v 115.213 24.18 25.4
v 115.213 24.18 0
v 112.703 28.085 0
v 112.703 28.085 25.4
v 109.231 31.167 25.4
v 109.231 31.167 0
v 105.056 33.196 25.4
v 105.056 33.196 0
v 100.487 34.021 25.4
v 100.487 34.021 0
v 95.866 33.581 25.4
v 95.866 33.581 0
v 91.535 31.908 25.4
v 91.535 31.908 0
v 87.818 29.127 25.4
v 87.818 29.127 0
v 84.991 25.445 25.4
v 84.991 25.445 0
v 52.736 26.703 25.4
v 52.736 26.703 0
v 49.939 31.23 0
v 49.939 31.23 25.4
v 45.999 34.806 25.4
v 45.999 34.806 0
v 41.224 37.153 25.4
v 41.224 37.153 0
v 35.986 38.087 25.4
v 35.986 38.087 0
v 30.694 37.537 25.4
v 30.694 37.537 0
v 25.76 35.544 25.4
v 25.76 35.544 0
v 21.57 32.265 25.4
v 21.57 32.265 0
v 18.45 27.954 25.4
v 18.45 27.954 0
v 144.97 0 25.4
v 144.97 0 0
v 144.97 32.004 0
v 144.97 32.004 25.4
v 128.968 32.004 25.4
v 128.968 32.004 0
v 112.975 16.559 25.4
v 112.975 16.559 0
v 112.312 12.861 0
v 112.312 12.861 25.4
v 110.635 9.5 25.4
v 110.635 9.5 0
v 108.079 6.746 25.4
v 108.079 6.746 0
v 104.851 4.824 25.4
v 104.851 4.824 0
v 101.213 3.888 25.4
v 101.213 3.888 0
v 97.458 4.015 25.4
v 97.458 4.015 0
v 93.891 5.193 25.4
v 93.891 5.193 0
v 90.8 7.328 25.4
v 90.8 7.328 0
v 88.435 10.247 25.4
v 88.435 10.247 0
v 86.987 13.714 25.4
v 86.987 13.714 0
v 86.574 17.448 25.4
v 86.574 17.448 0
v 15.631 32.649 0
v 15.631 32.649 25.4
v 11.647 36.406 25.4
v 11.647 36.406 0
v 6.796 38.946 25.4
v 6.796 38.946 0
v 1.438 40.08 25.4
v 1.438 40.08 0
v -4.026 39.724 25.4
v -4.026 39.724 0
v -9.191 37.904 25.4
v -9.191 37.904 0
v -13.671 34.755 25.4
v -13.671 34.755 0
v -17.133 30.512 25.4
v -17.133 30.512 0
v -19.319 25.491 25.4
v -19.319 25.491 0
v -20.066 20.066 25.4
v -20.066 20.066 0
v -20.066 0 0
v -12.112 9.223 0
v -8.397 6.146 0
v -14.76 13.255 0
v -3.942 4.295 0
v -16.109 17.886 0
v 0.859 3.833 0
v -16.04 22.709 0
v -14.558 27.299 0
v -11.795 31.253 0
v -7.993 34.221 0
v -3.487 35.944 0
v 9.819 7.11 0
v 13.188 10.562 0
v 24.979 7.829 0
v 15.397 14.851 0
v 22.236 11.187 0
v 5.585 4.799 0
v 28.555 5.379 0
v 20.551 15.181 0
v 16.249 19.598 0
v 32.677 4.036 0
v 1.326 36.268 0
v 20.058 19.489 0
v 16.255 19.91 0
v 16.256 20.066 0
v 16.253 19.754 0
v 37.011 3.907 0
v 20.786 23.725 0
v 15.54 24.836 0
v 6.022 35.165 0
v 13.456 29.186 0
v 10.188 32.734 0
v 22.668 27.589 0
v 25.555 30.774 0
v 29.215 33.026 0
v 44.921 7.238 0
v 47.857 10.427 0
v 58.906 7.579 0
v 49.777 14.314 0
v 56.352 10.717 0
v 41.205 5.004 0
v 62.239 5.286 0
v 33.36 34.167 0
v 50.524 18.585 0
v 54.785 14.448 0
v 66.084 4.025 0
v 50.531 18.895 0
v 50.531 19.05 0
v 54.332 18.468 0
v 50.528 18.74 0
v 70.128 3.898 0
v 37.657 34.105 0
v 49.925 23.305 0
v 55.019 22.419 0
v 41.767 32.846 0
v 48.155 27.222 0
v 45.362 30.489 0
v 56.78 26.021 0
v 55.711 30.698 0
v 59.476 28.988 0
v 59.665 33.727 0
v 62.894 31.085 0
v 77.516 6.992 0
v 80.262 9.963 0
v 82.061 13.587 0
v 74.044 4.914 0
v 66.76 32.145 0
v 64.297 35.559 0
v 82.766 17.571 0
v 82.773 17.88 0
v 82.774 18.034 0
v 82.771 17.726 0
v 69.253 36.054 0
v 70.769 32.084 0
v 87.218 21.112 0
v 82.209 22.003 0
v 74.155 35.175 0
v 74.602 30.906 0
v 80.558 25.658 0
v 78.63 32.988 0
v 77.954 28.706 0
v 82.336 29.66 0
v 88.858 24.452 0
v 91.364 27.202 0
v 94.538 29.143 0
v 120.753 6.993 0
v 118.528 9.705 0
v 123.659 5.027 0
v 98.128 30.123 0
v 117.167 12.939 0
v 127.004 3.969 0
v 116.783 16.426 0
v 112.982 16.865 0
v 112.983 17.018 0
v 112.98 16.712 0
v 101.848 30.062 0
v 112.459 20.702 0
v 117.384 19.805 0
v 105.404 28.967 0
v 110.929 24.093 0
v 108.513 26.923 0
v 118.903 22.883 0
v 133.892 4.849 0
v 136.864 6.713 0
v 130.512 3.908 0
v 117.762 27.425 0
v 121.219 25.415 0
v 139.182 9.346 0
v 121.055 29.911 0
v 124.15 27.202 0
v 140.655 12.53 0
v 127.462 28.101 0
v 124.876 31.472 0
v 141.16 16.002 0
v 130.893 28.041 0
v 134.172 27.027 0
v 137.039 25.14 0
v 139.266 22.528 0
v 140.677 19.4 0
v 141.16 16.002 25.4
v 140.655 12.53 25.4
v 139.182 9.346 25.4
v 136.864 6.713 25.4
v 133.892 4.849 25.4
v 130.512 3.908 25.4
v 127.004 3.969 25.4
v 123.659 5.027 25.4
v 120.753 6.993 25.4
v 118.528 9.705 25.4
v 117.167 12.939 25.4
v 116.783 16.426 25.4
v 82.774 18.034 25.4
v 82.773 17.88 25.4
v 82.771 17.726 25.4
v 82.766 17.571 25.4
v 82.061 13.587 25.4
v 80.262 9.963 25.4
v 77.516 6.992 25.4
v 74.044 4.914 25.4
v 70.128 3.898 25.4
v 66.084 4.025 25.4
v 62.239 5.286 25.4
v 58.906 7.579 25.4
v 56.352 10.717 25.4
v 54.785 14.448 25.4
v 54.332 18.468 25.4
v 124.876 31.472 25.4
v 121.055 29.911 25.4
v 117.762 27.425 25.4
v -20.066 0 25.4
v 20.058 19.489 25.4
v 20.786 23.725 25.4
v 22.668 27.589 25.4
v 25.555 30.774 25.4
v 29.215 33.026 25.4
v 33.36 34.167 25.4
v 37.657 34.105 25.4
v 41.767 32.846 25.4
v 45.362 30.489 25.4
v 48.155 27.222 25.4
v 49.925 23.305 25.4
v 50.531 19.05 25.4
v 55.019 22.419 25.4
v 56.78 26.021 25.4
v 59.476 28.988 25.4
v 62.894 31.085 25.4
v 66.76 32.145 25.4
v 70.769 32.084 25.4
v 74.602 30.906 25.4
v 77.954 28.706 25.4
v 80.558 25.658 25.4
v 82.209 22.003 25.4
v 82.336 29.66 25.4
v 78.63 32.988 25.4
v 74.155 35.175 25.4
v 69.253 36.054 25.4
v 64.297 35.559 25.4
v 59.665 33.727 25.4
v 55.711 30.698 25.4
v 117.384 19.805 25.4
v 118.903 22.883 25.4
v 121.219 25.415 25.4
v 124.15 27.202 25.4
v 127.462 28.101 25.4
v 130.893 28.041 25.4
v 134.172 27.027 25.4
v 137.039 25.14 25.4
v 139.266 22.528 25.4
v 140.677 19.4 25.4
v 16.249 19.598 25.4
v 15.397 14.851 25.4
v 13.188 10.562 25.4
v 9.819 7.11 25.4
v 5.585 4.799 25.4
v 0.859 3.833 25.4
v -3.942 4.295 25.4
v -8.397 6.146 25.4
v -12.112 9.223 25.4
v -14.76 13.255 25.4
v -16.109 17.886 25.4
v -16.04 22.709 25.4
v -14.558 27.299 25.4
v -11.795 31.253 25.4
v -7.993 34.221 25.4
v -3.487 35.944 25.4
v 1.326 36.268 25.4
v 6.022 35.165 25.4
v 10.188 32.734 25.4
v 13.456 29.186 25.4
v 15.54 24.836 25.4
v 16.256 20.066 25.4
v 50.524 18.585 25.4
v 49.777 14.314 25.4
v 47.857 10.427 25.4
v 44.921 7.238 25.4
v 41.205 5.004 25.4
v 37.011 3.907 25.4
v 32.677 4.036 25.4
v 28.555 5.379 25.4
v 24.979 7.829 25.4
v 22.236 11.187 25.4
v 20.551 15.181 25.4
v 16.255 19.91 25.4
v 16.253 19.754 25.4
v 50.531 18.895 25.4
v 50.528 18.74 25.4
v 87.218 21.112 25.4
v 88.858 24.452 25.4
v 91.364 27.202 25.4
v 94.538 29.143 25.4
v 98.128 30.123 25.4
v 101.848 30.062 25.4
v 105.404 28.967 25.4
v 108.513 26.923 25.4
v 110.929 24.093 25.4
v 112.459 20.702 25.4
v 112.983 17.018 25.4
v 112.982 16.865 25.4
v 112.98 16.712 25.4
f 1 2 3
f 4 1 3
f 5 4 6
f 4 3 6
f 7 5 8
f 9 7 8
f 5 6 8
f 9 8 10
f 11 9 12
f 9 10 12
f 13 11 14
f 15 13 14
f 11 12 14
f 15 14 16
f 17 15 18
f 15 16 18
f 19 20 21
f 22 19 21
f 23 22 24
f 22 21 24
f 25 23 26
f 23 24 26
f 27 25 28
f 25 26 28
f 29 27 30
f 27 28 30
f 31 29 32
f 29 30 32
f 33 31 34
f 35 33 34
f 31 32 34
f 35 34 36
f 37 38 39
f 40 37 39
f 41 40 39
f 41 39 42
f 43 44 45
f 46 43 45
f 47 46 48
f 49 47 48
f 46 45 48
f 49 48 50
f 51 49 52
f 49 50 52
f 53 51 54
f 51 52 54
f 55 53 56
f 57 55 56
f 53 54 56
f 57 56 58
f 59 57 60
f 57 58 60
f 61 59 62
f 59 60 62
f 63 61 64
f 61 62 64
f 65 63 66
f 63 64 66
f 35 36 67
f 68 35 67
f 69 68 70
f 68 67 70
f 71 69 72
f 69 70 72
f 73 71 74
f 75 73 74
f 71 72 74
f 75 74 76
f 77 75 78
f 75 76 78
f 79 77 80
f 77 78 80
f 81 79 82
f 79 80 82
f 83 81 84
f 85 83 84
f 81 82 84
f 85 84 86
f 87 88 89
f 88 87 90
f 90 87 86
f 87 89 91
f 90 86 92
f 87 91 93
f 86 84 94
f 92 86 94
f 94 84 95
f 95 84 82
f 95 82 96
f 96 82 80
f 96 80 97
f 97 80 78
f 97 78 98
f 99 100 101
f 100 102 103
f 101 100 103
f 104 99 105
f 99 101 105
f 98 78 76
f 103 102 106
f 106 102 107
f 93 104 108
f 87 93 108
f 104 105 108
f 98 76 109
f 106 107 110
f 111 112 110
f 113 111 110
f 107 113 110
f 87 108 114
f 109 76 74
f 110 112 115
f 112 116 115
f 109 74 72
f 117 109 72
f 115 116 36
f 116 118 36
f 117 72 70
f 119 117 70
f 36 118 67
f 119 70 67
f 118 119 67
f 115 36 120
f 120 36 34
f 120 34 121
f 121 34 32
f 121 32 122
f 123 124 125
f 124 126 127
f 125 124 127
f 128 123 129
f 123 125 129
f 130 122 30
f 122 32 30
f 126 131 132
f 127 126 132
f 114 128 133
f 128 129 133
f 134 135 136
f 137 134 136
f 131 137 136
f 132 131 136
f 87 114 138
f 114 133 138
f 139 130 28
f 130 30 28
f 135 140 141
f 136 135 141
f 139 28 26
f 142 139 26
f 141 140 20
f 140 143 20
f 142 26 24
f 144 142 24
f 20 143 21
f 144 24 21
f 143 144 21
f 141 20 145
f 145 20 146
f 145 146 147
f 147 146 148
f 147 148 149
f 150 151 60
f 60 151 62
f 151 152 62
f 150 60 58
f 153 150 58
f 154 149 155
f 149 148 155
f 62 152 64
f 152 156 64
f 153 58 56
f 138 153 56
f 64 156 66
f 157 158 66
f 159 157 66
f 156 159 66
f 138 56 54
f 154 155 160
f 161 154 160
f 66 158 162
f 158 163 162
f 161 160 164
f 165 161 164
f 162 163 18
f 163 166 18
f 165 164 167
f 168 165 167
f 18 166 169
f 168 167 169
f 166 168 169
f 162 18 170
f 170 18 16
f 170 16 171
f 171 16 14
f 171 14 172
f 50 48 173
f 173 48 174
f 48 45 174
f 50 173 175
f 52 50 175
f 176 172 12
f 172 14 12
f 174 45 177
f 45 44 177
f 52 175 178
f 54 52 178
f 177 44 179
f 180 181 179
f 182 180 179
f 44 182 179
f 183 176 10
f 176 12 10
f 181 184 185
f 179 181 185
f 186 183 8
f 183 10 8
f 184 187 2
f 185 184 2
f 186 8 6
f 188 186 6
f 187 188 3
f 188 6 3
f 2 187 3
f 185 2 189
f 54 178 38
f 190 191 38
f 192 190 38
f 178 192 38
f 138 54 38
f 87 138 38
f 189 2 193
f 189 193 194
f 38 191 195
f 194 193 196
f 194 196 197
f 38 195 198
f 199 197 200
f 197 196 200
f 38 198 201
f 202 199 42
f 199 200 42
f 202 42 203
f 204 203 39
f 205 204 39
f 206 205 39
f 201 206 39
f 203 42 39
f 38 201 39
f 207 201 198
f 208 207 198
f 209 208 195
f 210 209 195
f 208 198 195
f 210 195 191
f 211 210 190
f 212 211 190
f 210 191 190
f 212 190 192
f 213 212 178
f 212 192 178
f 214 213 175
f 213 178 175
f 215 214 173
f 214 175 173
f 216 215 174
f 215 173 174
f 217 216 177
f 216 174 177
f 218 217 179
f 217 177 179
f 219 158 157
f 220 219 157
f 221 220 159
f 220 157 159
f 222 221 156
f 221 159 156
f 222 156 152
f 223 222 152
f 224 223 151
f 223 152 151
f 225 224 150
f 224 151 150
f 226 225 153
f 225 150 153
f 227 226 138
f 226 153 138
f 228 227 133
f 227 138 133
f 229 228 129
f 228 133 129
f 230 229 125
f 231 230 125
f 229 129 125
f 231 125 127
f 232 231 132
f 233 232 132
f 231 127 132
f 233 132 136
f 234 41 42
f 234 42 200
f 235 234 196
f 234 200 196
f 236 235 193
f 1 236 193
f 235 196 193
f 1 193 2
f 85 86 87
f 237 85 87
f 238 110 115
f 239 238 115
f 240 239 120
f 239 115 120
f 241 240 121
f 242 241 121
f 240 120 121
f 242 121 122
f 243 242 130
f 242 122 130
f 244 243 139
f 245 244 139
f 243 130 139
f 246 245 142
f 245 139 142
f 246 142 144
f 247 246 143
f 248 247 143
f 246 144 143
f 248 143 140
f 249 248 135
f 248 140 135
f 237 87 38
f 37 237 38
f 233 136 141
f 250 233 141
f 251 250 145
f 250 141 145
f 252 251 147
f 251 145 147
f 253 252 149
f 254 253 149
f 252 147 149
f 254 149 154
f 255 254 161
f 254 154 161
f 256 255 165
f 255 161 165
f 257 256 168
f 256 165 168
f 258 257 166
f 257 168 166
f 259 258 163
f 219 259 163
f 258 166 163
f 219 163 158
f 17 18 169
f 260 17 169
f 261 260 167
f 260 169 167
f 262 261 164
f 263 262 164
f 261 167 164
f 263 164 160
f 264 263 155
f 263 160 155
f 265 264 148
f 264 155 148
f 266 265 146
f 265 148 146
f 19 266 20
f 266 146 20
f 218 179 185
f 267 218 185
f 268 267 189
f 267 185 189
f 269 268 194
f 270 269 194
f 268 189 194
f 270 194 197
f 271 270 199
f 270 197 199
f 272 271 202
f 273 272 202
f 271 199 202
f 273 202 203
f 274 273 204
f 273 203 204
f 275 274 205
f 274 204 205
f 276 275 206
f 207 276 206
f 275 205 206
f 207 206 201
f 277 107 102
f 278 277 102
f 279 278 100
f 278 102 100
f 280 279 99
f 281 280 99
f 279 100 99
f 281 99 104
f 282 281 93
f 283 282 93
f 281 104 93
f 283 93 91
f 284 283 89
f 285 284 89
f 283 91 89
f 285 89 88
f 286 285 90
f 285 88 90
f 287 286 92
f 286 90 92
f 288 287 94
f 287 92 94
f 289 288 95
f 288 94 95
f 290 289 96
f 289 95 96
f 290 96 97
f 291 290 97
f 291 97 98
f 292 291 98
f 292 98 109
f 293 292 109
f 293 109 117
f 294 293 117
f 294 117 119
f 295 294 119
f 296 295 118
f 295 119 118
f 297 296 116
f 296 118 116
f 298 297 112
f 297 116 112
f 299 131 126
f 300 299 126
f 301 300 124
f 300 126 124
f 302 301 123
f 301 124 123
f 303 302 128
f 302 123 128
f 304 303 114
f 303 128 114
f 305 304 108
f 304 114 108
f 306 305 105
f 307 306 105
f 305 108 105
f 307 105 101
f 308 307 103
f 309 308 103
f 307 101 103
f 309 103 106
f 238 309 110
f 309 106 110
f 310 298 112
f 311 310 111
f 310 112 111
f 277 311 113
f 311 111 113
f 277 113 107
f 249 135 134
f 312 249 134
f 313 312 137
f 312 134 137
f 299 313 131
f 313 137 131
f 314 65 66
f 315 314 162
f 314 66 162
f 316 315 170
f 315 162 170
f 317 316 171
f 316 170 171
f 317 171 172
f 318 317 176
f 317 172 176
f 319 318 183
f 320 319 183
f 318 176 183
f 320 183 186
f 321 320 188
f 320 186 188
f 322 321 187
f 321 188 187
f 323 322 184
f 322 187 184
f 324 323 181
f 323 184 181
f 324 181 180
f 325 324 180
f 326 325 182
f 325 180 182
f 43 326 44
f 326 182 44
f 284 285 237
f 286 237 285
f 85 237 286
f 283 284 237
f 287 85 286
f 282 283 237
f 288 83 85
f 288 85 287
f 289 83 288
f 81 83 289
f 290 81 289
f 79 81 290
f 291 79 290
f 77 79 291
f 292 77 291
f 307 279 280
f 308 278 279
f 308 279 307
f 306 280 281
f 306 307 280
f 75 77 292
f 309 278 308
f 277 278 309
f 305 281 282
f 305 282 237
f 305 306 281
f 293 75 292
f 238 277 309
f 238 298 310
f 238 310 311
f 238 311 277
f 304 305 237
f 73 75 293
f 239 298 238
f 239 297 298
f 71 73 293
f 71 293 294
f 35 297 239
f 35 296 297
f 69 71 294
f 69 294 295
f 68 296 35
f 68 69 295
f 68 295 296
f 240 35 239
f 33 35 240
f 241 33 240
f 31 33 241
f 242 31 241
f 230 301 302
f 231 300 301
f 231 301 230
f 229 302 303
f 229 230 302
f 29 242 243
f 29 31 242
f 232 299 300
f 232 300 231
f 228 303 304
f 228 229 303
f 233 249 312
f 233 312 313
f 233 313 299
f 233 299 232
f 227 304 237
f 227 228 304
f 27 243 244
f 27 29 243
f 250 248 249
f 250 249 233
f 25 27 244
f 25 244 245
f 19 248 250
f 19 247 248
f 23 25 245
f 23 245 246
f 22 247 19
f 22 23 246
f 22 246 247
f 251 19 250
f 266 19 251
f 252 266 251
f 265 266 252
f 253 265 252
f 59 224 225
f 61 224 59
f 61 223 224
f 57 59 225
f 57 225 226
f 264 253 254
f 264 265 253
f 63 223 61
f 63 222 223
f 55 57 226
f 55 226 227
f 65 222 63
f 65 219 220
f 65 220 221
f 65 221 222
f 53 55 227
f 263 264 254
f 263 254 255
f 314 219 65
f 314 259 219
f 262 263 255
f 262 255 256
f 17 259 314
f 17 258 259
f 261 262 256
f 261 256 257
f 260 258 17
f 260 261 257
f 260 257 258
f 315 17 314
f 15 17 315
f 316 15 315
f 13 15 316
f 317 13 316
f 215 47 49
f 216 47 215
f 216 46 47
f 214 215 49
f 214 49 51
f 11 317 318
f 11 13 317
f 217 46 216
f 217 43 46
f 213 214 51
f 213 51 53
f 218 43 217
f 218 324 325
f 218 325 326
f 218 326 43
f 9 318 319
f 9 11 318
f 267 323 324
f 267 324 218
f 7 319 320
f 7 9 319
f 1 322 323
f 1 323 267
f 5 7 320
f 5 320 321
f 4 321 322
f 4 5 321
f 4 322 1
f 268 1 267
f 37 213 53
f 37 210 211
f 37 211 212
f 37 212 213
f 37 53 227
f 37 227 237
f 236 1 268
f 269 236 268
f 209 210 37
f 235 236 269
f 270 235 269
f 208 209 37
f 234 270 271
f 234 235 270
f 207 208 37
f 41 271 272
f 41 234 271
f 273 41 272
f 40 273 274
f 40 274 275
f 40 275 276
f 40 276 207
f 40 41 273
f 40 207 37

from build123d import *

# Parameters (mm, degrees)
F1_DEPTH = 25.4


with BuildPart() as f1:
    # F0 (on Top) → F1 (new body)
    with BuildSketch(Plane.XY):
        with BuildLine():
            ThreePointArc((0, 0), (-14.1888046713, 5.8771953287), (-20.066, 20.066))
            Line((-20.066, 20.066), (-20.066, 0))
            Line((-20.066, 0), (0, 0))
        make_face()
        with BuildLine():
            ThreePointArc((17.9660905129, 11.129336882), (16.6211524445, 15.2651396685), (16.2492676931, 19.598201499))
            ThreePointArc((16.2492676931, 19.598201499), (16.8698181027, 23.9026921501), (18.4504618661, 27.9542705917))
            ThreePointArc((18.4504618661, 27.9542705917), (-4.0260022476, 39.7239668812), (-20.066, 20.066))
            ThreePointArc((-20.066, 20.066), (-14.1888046713, 5.8771953287), (0, 0))
            ThreePointArc((0, 0), (10.5669596828, 3.0077551002), (17.9660905129, 11.129336882))
        make_face()
        with BuildLine():
            ThreePointArc((16.2492676931, 19.598201499), (-16.2543168361, 20.2999234712), (16.256, 20.066))
            ThreePointArc((16.256, 20.066), (16.2543168361, 19.8320765288), (16.2492676931, 19.598201499))
        make_face(mode=Mode.SUBTRACT)
        with BuildLine():
            ThreePointArc((18.4504618661, 27.9542705917), (16.8698181027, 23.9026921501), (16.2492676931, 19.598201499))
            ThreePointArc((16.2492676931, 19.598201499), (16.6211524445, 15.2651396685), (17.9660905129, 11.129336882))
            ThreePointArc((17.9660905129, 11.129336882), (19.4658964939, 15.1953501781), (20.0576898143, 19.4885614204))
            ThreePointArc((20.0576898143, 19.4885614204), (20.063922346, 19.7772508128), (20.066, 20.066))
            ThreePointArc((20.066, 20.066), (19.6579668812, 24.0920022476), (18.4504618661, 27.9542705917))
        make_face()
        with BuildLine():
            ThreePointArc((35.2913783636, 0), (24.9954114371, 3.0220379638), (17.9660905129, 11.129336882))
            ThreePointArc((17.9660905129, 11.129336882), (10.5669596828, 3.0077551002), (0, 0))
            Line((0, 0), (35.2913783636, 0))
        make_face()
        with BuildLine():
            ThreePointArc((52.7363723922, 26.7034096963), (35.9859218001, 38.087334616), (18.4504618661, 27.9542705917))
            ThreePointArc((18.4504618661, 27.9542705917), (19.6579668812, 24.0920022476), (20.066, 20.066))
            ThreePointArc((20.066, 20.066), (20.063922346, 19.7772508128), (20.0576898143, 19.4885614204))
            ThreePointArc((20.0576898143, 19.4885614204), (35.5106816843, 34.2884220315), (50.5313782672, 19.05))
            ThreePointArc((50.5313782672, 19.05), (50.5296016293, 18.8173011199), (50.5242721296, 18.5846564946))
            ThreePointArc((50.5242721296, 18.5846564946), (51.150167686, 22.7748598412), (52.7363723922, 26.7034096963))
        make_face()
        with BuildLine():
            ThreePointArc((20.0576898143, 19.4885614204), (19.4658964939, 15.1953501781), (17.9660905129, 11.129336882))
            ThreePointArc((17.9660905129, 11.129336882), (24.9954114371, 3.0220379638), (35.2913783636, 0))
            ThreePointArc((35.2913783636, 0), (45.2184017505, 2.7909500658), (52.2366769647, 10.3460151624))
            ThreePointArc((52.2366769647, 10.3460151624), (50.8932296176, 14.3640617786), (50.5242721296, 18.5846564946))
            ThreePointArc((50.5242721296, 18.5846564946), (34.8394256297, 3.8167029566), (20.0576898143, 19.4885614204))
        make_face()
        with BuildLine():
            ThreePointArc((54.3413782672, 19.05), (53.9358095817, 22.9599464139), (52.7363723922, 26.7034096963))
            ThreePointArc((52.7363723922, 26.7034096963), (51.150167686, 22.7748598412), (50.5242721296, 18.5846564946))
            ThreePointArc((50.5242721296, 18.5846564946), (50.8932296176, 14.3640617786), (52.2366769647, 10.3460151624))
            ThreePointArc((52.2366769647, 10.3460151624), (53.7372042015, 14.2903775777), (54.3324955841, 18.4683202558))
            ThreePointArc((54.3324955841, 18.4683202558), (54.339157467, 18.7591262186), (54.3413782672, 19.05))
        make_face()
        with BuildLine():
            ThreePointArc((52.2366769647, 10.3460151624), (45.2184017505, 2.7909500658), (35.2913783636, 0))
            Line((35.2913783636, 0), (68.5498631996, 0))
            ThreePointArc((68.5498631996, 0), (58.8911873733, 2.8045831602), (52.2366769647, 10.3460151624))
        make_face()
        with BuildLine():
            ThreePointArc((54.3324955841, 18.4683202558), (53.7372042015, 14.2903775777), (52.2366769647, 10.3460151624))
            ThreePointArc((52.2366769647, 10.3460151624), (58.8911873733, 2.8045831602), (68.5498631996, 0))
            ThreePointArc((68.5498631996, 0), (77.8389985645, 2.576408979), (84.4739682688, 9.5694838446))
            ThreePointArc((84.4739682688, 9.5694838446), (83.1320884093, 13.4663031835), (82.7663397489, 17.5714305184))
            ThreePointArc((82.7663397489, 17.5714305184), (68.1014181096, 3.8170709012), (54.3324955841, 18.4683202558))
        make_face()
        with BuildLine():
            ThreePointArc((86.5838631996, 18.034), (86.1810315428, 21.8243903304), (84.9905329505, 25.4454461574))
            ThreePointArc((84.9905329505, 25.4454461574), (83.3981736494, 21.644099363), (82.7663397489, 17.5714305184))
            ThreePointArc((82.7663397489, 17.5714305184), (83.1320884093, 13.4663031835), (84.4739682688, 9.5694838446))
            ThreePointArc((84.4739682688, 9.5694838446), (85.9751949602, 13.388252586), (86.5743245521, 17.4475283849))
            ThreePointArc((86.5743245521, 17.4475283849), (86.5814783801, 17.7407254097), (86.5838631996, 18.034))
        make_face()
        with BuildLine():
            ThreePointArc((84.9905329505, 25.4454461574), (69.2526835345, 36.0542996528), (52.7363723922, 26.7034096963))
            ThreePointArc((52.7363723922, 26.7034096963), (53.9358095817, 22.9599464139), (54.3413782672, 19.05))
            ThreePointArc((54.3413782672, 19.05), (54.339157467, 18.7591262186), (54.3324955841, 18.4683202558))
            ThreePointArc((54.3324955841, 18.4683202558), (68.7670486464, 32.2563418072), (82.7738631996, 18.034))
            ThreePointArc((82.7738631996, 18.034), (82.7719822126, 17.80268467), (82.7663397489, 17.5714305184))
            ThreePointArc((82.7663397489, 17.5714305184), (83.3981736494, 21.644099363), (84.9905329505, 25.4454461574))
        make_face()
        with BuildLine():
            ThreePointArc((84.4739682688, 9.5694838446), (77.8389985645, 2.576408979), (68.5498631996, 0))
            Line((68.5498631996, 0), (99.7753385043, 0))
            ThreePointArc((99.7753385043, 0), (90.751661979, 2.5893622969), (84.4739682688, 9.5694838446))
        make_face()
        with BuildLine():
            ThreePointArc((86.5743245521, 17.4475283849), (85.9751949602, 13.388252586), (84.4739682688, 9.5694838446))
            ThreePointArc((84.4739682688, 9.5694838446), (90.751661979, 2.5893622969), (99.7753385043, 0))
            ThreePointArc((99.7753385043, 0), (108.4287993719, 2.3643335983), (114.6777863565, 8.8003743081))
            ThreePointArc((114.6777863565, 8.8003743081), (113.3375545812, 12.572175467), (112.9753463662, 16.5585912009))
            ThreePointArc((112.9753463662, 16.5585912009), (99.3308696276, 3.8174806383), (86.5743245521, 17.4475283849))
        make_face()
        with BuildLine():
            ThreePointArc((115.2130425103, 24.1796771097), (100.4874564143, 34.0210941914), (84.9905329505, 25.4454461574))
            ThreePointArc((84.9905329505, 25.4454461574), (86.1810315428, 21.8243903304), (86.5838631996, 18.034))
            ThreePointArc((86.5838631996, 18.034), (86.5814783801, 17.7407254097), (86.5743245521, 17.4475283849))
            ThreePointArc((86.5743245521, 17.4475283849), (99.9901311009, 30.2242533726), (112.9833385043, 17.018))
            ThreePointArc((112.9833385043, 17.018), (112.9813403186, 16.7882608441), (112.9753463662, 16.5585912009))
            ThreePointArc((112.9753463662, 16.5585912009), (113.6138262125, 20.5101794262), (115.2130425103, 24.1796771097))
        make_face()
        with BuildLine():
            ThreePointArc((116.7933385043, 17.018), (116.3935690174, 20.6849794945), (115.2130425103, 24.1796771097))
            ThreePointArc((115.2130425103, 24.1796771097), (113.6138262125, 20.5101794262), (112.9753463662, 16.5585912009))
            ThreePointArc((112.9753463662, 16.5585912009), (113.3375545812, 12.572175467), (114.6777863565, 8.8003743081))
            ThreePointArc((114.6777863565, 8.8003743081), (116.1796742164, 12.4891928897), (116.7830409477, 16.4260696034))
            ThreePointArc((116.7830409477, 16.4260696034), (116.7907639204, 16.7219900196), (116.7933385043, 17.018))
        make_face()
        with BuildLine():
            ThreePointArc((128.9676635915, 32.004), (121.0554952765, 29.9110472914), (115.2130425103, 24.1796771097))
            ThreePointArc((115.2130425103, 24.1796771097), (116.3935690174, 20.6849794945), (116.7933385043, 17.018))
            ThreePointArc((116.7933385043, 17.018), (116.7907639204, 16.7219900196), (116.7830409477, 16.4260696034))
            ThreePointArc((116.7830409477, 16.4260696034), (116.1796742164, 12.4891928897), (114.6777863565, 8.8003743081))
            ThreePointArc((114.6777863565, 8.8003743081), (120.5764899645, 2.3765748998), (128.9676635915, 0))
            ThreePointArc((128.9676635915, 0), (140.2827863041, 4.6868772875), (144.9696635915, 16.002))
            ThreePointArc((144.9696635915, 16.002), (140.2827863041, 27.3171227125), (128.9676635915, 32.004))
        make_face()
        with BuildLine():
            ThreePointArc((141.1596635915, 16.002), (128.7555967071, 3.8118444786), (116.7830409477, 16.4260696034))
            ThreePointArc((116.7830409477, 16.4260696034), (129.179730476, 28.1921555214), (141.1596635915, 16.002))
        make_face(mode=Mode.SUBTRACT)
        with BuildLine():
            ThreePointArc((114.6777863565, 8.8003743081), (108.4287993719, 2.3643335983), (99.7753385043, 0))
            Line((99.7753385043, 0), (128.9676635915, 0))
            ThreePointArc((128.9676635915, 0), (120.5764899645, 2.3765748998), (114.6777863565, 8.8003743081))
        make_face()
        with BuildLine():
            ThreePointArc((144.9696635915, 16.002), (140.2827863041, 4.6868772875), (128.9676635915, 0))
            Line((128.9676635915, 0), (144.9696635915, 0))
            Line((144.9696635915, 0), (144.9696635915, 16.002))
        make_face()
        with BuildLine():
            Line((144.9696635915, 32.004), (128.9676635915, 32.004))
            ThreePointArc((128.9676635915, 32.004), (140.2827863041, 27.3171227125), (144.9696635915, 16.002))
            Line((144.9696635915, 16.002), (144.9696635915, 32.004))
        make_face()
    extrude(amount=F1_DEPTH)


solid = f1.part
